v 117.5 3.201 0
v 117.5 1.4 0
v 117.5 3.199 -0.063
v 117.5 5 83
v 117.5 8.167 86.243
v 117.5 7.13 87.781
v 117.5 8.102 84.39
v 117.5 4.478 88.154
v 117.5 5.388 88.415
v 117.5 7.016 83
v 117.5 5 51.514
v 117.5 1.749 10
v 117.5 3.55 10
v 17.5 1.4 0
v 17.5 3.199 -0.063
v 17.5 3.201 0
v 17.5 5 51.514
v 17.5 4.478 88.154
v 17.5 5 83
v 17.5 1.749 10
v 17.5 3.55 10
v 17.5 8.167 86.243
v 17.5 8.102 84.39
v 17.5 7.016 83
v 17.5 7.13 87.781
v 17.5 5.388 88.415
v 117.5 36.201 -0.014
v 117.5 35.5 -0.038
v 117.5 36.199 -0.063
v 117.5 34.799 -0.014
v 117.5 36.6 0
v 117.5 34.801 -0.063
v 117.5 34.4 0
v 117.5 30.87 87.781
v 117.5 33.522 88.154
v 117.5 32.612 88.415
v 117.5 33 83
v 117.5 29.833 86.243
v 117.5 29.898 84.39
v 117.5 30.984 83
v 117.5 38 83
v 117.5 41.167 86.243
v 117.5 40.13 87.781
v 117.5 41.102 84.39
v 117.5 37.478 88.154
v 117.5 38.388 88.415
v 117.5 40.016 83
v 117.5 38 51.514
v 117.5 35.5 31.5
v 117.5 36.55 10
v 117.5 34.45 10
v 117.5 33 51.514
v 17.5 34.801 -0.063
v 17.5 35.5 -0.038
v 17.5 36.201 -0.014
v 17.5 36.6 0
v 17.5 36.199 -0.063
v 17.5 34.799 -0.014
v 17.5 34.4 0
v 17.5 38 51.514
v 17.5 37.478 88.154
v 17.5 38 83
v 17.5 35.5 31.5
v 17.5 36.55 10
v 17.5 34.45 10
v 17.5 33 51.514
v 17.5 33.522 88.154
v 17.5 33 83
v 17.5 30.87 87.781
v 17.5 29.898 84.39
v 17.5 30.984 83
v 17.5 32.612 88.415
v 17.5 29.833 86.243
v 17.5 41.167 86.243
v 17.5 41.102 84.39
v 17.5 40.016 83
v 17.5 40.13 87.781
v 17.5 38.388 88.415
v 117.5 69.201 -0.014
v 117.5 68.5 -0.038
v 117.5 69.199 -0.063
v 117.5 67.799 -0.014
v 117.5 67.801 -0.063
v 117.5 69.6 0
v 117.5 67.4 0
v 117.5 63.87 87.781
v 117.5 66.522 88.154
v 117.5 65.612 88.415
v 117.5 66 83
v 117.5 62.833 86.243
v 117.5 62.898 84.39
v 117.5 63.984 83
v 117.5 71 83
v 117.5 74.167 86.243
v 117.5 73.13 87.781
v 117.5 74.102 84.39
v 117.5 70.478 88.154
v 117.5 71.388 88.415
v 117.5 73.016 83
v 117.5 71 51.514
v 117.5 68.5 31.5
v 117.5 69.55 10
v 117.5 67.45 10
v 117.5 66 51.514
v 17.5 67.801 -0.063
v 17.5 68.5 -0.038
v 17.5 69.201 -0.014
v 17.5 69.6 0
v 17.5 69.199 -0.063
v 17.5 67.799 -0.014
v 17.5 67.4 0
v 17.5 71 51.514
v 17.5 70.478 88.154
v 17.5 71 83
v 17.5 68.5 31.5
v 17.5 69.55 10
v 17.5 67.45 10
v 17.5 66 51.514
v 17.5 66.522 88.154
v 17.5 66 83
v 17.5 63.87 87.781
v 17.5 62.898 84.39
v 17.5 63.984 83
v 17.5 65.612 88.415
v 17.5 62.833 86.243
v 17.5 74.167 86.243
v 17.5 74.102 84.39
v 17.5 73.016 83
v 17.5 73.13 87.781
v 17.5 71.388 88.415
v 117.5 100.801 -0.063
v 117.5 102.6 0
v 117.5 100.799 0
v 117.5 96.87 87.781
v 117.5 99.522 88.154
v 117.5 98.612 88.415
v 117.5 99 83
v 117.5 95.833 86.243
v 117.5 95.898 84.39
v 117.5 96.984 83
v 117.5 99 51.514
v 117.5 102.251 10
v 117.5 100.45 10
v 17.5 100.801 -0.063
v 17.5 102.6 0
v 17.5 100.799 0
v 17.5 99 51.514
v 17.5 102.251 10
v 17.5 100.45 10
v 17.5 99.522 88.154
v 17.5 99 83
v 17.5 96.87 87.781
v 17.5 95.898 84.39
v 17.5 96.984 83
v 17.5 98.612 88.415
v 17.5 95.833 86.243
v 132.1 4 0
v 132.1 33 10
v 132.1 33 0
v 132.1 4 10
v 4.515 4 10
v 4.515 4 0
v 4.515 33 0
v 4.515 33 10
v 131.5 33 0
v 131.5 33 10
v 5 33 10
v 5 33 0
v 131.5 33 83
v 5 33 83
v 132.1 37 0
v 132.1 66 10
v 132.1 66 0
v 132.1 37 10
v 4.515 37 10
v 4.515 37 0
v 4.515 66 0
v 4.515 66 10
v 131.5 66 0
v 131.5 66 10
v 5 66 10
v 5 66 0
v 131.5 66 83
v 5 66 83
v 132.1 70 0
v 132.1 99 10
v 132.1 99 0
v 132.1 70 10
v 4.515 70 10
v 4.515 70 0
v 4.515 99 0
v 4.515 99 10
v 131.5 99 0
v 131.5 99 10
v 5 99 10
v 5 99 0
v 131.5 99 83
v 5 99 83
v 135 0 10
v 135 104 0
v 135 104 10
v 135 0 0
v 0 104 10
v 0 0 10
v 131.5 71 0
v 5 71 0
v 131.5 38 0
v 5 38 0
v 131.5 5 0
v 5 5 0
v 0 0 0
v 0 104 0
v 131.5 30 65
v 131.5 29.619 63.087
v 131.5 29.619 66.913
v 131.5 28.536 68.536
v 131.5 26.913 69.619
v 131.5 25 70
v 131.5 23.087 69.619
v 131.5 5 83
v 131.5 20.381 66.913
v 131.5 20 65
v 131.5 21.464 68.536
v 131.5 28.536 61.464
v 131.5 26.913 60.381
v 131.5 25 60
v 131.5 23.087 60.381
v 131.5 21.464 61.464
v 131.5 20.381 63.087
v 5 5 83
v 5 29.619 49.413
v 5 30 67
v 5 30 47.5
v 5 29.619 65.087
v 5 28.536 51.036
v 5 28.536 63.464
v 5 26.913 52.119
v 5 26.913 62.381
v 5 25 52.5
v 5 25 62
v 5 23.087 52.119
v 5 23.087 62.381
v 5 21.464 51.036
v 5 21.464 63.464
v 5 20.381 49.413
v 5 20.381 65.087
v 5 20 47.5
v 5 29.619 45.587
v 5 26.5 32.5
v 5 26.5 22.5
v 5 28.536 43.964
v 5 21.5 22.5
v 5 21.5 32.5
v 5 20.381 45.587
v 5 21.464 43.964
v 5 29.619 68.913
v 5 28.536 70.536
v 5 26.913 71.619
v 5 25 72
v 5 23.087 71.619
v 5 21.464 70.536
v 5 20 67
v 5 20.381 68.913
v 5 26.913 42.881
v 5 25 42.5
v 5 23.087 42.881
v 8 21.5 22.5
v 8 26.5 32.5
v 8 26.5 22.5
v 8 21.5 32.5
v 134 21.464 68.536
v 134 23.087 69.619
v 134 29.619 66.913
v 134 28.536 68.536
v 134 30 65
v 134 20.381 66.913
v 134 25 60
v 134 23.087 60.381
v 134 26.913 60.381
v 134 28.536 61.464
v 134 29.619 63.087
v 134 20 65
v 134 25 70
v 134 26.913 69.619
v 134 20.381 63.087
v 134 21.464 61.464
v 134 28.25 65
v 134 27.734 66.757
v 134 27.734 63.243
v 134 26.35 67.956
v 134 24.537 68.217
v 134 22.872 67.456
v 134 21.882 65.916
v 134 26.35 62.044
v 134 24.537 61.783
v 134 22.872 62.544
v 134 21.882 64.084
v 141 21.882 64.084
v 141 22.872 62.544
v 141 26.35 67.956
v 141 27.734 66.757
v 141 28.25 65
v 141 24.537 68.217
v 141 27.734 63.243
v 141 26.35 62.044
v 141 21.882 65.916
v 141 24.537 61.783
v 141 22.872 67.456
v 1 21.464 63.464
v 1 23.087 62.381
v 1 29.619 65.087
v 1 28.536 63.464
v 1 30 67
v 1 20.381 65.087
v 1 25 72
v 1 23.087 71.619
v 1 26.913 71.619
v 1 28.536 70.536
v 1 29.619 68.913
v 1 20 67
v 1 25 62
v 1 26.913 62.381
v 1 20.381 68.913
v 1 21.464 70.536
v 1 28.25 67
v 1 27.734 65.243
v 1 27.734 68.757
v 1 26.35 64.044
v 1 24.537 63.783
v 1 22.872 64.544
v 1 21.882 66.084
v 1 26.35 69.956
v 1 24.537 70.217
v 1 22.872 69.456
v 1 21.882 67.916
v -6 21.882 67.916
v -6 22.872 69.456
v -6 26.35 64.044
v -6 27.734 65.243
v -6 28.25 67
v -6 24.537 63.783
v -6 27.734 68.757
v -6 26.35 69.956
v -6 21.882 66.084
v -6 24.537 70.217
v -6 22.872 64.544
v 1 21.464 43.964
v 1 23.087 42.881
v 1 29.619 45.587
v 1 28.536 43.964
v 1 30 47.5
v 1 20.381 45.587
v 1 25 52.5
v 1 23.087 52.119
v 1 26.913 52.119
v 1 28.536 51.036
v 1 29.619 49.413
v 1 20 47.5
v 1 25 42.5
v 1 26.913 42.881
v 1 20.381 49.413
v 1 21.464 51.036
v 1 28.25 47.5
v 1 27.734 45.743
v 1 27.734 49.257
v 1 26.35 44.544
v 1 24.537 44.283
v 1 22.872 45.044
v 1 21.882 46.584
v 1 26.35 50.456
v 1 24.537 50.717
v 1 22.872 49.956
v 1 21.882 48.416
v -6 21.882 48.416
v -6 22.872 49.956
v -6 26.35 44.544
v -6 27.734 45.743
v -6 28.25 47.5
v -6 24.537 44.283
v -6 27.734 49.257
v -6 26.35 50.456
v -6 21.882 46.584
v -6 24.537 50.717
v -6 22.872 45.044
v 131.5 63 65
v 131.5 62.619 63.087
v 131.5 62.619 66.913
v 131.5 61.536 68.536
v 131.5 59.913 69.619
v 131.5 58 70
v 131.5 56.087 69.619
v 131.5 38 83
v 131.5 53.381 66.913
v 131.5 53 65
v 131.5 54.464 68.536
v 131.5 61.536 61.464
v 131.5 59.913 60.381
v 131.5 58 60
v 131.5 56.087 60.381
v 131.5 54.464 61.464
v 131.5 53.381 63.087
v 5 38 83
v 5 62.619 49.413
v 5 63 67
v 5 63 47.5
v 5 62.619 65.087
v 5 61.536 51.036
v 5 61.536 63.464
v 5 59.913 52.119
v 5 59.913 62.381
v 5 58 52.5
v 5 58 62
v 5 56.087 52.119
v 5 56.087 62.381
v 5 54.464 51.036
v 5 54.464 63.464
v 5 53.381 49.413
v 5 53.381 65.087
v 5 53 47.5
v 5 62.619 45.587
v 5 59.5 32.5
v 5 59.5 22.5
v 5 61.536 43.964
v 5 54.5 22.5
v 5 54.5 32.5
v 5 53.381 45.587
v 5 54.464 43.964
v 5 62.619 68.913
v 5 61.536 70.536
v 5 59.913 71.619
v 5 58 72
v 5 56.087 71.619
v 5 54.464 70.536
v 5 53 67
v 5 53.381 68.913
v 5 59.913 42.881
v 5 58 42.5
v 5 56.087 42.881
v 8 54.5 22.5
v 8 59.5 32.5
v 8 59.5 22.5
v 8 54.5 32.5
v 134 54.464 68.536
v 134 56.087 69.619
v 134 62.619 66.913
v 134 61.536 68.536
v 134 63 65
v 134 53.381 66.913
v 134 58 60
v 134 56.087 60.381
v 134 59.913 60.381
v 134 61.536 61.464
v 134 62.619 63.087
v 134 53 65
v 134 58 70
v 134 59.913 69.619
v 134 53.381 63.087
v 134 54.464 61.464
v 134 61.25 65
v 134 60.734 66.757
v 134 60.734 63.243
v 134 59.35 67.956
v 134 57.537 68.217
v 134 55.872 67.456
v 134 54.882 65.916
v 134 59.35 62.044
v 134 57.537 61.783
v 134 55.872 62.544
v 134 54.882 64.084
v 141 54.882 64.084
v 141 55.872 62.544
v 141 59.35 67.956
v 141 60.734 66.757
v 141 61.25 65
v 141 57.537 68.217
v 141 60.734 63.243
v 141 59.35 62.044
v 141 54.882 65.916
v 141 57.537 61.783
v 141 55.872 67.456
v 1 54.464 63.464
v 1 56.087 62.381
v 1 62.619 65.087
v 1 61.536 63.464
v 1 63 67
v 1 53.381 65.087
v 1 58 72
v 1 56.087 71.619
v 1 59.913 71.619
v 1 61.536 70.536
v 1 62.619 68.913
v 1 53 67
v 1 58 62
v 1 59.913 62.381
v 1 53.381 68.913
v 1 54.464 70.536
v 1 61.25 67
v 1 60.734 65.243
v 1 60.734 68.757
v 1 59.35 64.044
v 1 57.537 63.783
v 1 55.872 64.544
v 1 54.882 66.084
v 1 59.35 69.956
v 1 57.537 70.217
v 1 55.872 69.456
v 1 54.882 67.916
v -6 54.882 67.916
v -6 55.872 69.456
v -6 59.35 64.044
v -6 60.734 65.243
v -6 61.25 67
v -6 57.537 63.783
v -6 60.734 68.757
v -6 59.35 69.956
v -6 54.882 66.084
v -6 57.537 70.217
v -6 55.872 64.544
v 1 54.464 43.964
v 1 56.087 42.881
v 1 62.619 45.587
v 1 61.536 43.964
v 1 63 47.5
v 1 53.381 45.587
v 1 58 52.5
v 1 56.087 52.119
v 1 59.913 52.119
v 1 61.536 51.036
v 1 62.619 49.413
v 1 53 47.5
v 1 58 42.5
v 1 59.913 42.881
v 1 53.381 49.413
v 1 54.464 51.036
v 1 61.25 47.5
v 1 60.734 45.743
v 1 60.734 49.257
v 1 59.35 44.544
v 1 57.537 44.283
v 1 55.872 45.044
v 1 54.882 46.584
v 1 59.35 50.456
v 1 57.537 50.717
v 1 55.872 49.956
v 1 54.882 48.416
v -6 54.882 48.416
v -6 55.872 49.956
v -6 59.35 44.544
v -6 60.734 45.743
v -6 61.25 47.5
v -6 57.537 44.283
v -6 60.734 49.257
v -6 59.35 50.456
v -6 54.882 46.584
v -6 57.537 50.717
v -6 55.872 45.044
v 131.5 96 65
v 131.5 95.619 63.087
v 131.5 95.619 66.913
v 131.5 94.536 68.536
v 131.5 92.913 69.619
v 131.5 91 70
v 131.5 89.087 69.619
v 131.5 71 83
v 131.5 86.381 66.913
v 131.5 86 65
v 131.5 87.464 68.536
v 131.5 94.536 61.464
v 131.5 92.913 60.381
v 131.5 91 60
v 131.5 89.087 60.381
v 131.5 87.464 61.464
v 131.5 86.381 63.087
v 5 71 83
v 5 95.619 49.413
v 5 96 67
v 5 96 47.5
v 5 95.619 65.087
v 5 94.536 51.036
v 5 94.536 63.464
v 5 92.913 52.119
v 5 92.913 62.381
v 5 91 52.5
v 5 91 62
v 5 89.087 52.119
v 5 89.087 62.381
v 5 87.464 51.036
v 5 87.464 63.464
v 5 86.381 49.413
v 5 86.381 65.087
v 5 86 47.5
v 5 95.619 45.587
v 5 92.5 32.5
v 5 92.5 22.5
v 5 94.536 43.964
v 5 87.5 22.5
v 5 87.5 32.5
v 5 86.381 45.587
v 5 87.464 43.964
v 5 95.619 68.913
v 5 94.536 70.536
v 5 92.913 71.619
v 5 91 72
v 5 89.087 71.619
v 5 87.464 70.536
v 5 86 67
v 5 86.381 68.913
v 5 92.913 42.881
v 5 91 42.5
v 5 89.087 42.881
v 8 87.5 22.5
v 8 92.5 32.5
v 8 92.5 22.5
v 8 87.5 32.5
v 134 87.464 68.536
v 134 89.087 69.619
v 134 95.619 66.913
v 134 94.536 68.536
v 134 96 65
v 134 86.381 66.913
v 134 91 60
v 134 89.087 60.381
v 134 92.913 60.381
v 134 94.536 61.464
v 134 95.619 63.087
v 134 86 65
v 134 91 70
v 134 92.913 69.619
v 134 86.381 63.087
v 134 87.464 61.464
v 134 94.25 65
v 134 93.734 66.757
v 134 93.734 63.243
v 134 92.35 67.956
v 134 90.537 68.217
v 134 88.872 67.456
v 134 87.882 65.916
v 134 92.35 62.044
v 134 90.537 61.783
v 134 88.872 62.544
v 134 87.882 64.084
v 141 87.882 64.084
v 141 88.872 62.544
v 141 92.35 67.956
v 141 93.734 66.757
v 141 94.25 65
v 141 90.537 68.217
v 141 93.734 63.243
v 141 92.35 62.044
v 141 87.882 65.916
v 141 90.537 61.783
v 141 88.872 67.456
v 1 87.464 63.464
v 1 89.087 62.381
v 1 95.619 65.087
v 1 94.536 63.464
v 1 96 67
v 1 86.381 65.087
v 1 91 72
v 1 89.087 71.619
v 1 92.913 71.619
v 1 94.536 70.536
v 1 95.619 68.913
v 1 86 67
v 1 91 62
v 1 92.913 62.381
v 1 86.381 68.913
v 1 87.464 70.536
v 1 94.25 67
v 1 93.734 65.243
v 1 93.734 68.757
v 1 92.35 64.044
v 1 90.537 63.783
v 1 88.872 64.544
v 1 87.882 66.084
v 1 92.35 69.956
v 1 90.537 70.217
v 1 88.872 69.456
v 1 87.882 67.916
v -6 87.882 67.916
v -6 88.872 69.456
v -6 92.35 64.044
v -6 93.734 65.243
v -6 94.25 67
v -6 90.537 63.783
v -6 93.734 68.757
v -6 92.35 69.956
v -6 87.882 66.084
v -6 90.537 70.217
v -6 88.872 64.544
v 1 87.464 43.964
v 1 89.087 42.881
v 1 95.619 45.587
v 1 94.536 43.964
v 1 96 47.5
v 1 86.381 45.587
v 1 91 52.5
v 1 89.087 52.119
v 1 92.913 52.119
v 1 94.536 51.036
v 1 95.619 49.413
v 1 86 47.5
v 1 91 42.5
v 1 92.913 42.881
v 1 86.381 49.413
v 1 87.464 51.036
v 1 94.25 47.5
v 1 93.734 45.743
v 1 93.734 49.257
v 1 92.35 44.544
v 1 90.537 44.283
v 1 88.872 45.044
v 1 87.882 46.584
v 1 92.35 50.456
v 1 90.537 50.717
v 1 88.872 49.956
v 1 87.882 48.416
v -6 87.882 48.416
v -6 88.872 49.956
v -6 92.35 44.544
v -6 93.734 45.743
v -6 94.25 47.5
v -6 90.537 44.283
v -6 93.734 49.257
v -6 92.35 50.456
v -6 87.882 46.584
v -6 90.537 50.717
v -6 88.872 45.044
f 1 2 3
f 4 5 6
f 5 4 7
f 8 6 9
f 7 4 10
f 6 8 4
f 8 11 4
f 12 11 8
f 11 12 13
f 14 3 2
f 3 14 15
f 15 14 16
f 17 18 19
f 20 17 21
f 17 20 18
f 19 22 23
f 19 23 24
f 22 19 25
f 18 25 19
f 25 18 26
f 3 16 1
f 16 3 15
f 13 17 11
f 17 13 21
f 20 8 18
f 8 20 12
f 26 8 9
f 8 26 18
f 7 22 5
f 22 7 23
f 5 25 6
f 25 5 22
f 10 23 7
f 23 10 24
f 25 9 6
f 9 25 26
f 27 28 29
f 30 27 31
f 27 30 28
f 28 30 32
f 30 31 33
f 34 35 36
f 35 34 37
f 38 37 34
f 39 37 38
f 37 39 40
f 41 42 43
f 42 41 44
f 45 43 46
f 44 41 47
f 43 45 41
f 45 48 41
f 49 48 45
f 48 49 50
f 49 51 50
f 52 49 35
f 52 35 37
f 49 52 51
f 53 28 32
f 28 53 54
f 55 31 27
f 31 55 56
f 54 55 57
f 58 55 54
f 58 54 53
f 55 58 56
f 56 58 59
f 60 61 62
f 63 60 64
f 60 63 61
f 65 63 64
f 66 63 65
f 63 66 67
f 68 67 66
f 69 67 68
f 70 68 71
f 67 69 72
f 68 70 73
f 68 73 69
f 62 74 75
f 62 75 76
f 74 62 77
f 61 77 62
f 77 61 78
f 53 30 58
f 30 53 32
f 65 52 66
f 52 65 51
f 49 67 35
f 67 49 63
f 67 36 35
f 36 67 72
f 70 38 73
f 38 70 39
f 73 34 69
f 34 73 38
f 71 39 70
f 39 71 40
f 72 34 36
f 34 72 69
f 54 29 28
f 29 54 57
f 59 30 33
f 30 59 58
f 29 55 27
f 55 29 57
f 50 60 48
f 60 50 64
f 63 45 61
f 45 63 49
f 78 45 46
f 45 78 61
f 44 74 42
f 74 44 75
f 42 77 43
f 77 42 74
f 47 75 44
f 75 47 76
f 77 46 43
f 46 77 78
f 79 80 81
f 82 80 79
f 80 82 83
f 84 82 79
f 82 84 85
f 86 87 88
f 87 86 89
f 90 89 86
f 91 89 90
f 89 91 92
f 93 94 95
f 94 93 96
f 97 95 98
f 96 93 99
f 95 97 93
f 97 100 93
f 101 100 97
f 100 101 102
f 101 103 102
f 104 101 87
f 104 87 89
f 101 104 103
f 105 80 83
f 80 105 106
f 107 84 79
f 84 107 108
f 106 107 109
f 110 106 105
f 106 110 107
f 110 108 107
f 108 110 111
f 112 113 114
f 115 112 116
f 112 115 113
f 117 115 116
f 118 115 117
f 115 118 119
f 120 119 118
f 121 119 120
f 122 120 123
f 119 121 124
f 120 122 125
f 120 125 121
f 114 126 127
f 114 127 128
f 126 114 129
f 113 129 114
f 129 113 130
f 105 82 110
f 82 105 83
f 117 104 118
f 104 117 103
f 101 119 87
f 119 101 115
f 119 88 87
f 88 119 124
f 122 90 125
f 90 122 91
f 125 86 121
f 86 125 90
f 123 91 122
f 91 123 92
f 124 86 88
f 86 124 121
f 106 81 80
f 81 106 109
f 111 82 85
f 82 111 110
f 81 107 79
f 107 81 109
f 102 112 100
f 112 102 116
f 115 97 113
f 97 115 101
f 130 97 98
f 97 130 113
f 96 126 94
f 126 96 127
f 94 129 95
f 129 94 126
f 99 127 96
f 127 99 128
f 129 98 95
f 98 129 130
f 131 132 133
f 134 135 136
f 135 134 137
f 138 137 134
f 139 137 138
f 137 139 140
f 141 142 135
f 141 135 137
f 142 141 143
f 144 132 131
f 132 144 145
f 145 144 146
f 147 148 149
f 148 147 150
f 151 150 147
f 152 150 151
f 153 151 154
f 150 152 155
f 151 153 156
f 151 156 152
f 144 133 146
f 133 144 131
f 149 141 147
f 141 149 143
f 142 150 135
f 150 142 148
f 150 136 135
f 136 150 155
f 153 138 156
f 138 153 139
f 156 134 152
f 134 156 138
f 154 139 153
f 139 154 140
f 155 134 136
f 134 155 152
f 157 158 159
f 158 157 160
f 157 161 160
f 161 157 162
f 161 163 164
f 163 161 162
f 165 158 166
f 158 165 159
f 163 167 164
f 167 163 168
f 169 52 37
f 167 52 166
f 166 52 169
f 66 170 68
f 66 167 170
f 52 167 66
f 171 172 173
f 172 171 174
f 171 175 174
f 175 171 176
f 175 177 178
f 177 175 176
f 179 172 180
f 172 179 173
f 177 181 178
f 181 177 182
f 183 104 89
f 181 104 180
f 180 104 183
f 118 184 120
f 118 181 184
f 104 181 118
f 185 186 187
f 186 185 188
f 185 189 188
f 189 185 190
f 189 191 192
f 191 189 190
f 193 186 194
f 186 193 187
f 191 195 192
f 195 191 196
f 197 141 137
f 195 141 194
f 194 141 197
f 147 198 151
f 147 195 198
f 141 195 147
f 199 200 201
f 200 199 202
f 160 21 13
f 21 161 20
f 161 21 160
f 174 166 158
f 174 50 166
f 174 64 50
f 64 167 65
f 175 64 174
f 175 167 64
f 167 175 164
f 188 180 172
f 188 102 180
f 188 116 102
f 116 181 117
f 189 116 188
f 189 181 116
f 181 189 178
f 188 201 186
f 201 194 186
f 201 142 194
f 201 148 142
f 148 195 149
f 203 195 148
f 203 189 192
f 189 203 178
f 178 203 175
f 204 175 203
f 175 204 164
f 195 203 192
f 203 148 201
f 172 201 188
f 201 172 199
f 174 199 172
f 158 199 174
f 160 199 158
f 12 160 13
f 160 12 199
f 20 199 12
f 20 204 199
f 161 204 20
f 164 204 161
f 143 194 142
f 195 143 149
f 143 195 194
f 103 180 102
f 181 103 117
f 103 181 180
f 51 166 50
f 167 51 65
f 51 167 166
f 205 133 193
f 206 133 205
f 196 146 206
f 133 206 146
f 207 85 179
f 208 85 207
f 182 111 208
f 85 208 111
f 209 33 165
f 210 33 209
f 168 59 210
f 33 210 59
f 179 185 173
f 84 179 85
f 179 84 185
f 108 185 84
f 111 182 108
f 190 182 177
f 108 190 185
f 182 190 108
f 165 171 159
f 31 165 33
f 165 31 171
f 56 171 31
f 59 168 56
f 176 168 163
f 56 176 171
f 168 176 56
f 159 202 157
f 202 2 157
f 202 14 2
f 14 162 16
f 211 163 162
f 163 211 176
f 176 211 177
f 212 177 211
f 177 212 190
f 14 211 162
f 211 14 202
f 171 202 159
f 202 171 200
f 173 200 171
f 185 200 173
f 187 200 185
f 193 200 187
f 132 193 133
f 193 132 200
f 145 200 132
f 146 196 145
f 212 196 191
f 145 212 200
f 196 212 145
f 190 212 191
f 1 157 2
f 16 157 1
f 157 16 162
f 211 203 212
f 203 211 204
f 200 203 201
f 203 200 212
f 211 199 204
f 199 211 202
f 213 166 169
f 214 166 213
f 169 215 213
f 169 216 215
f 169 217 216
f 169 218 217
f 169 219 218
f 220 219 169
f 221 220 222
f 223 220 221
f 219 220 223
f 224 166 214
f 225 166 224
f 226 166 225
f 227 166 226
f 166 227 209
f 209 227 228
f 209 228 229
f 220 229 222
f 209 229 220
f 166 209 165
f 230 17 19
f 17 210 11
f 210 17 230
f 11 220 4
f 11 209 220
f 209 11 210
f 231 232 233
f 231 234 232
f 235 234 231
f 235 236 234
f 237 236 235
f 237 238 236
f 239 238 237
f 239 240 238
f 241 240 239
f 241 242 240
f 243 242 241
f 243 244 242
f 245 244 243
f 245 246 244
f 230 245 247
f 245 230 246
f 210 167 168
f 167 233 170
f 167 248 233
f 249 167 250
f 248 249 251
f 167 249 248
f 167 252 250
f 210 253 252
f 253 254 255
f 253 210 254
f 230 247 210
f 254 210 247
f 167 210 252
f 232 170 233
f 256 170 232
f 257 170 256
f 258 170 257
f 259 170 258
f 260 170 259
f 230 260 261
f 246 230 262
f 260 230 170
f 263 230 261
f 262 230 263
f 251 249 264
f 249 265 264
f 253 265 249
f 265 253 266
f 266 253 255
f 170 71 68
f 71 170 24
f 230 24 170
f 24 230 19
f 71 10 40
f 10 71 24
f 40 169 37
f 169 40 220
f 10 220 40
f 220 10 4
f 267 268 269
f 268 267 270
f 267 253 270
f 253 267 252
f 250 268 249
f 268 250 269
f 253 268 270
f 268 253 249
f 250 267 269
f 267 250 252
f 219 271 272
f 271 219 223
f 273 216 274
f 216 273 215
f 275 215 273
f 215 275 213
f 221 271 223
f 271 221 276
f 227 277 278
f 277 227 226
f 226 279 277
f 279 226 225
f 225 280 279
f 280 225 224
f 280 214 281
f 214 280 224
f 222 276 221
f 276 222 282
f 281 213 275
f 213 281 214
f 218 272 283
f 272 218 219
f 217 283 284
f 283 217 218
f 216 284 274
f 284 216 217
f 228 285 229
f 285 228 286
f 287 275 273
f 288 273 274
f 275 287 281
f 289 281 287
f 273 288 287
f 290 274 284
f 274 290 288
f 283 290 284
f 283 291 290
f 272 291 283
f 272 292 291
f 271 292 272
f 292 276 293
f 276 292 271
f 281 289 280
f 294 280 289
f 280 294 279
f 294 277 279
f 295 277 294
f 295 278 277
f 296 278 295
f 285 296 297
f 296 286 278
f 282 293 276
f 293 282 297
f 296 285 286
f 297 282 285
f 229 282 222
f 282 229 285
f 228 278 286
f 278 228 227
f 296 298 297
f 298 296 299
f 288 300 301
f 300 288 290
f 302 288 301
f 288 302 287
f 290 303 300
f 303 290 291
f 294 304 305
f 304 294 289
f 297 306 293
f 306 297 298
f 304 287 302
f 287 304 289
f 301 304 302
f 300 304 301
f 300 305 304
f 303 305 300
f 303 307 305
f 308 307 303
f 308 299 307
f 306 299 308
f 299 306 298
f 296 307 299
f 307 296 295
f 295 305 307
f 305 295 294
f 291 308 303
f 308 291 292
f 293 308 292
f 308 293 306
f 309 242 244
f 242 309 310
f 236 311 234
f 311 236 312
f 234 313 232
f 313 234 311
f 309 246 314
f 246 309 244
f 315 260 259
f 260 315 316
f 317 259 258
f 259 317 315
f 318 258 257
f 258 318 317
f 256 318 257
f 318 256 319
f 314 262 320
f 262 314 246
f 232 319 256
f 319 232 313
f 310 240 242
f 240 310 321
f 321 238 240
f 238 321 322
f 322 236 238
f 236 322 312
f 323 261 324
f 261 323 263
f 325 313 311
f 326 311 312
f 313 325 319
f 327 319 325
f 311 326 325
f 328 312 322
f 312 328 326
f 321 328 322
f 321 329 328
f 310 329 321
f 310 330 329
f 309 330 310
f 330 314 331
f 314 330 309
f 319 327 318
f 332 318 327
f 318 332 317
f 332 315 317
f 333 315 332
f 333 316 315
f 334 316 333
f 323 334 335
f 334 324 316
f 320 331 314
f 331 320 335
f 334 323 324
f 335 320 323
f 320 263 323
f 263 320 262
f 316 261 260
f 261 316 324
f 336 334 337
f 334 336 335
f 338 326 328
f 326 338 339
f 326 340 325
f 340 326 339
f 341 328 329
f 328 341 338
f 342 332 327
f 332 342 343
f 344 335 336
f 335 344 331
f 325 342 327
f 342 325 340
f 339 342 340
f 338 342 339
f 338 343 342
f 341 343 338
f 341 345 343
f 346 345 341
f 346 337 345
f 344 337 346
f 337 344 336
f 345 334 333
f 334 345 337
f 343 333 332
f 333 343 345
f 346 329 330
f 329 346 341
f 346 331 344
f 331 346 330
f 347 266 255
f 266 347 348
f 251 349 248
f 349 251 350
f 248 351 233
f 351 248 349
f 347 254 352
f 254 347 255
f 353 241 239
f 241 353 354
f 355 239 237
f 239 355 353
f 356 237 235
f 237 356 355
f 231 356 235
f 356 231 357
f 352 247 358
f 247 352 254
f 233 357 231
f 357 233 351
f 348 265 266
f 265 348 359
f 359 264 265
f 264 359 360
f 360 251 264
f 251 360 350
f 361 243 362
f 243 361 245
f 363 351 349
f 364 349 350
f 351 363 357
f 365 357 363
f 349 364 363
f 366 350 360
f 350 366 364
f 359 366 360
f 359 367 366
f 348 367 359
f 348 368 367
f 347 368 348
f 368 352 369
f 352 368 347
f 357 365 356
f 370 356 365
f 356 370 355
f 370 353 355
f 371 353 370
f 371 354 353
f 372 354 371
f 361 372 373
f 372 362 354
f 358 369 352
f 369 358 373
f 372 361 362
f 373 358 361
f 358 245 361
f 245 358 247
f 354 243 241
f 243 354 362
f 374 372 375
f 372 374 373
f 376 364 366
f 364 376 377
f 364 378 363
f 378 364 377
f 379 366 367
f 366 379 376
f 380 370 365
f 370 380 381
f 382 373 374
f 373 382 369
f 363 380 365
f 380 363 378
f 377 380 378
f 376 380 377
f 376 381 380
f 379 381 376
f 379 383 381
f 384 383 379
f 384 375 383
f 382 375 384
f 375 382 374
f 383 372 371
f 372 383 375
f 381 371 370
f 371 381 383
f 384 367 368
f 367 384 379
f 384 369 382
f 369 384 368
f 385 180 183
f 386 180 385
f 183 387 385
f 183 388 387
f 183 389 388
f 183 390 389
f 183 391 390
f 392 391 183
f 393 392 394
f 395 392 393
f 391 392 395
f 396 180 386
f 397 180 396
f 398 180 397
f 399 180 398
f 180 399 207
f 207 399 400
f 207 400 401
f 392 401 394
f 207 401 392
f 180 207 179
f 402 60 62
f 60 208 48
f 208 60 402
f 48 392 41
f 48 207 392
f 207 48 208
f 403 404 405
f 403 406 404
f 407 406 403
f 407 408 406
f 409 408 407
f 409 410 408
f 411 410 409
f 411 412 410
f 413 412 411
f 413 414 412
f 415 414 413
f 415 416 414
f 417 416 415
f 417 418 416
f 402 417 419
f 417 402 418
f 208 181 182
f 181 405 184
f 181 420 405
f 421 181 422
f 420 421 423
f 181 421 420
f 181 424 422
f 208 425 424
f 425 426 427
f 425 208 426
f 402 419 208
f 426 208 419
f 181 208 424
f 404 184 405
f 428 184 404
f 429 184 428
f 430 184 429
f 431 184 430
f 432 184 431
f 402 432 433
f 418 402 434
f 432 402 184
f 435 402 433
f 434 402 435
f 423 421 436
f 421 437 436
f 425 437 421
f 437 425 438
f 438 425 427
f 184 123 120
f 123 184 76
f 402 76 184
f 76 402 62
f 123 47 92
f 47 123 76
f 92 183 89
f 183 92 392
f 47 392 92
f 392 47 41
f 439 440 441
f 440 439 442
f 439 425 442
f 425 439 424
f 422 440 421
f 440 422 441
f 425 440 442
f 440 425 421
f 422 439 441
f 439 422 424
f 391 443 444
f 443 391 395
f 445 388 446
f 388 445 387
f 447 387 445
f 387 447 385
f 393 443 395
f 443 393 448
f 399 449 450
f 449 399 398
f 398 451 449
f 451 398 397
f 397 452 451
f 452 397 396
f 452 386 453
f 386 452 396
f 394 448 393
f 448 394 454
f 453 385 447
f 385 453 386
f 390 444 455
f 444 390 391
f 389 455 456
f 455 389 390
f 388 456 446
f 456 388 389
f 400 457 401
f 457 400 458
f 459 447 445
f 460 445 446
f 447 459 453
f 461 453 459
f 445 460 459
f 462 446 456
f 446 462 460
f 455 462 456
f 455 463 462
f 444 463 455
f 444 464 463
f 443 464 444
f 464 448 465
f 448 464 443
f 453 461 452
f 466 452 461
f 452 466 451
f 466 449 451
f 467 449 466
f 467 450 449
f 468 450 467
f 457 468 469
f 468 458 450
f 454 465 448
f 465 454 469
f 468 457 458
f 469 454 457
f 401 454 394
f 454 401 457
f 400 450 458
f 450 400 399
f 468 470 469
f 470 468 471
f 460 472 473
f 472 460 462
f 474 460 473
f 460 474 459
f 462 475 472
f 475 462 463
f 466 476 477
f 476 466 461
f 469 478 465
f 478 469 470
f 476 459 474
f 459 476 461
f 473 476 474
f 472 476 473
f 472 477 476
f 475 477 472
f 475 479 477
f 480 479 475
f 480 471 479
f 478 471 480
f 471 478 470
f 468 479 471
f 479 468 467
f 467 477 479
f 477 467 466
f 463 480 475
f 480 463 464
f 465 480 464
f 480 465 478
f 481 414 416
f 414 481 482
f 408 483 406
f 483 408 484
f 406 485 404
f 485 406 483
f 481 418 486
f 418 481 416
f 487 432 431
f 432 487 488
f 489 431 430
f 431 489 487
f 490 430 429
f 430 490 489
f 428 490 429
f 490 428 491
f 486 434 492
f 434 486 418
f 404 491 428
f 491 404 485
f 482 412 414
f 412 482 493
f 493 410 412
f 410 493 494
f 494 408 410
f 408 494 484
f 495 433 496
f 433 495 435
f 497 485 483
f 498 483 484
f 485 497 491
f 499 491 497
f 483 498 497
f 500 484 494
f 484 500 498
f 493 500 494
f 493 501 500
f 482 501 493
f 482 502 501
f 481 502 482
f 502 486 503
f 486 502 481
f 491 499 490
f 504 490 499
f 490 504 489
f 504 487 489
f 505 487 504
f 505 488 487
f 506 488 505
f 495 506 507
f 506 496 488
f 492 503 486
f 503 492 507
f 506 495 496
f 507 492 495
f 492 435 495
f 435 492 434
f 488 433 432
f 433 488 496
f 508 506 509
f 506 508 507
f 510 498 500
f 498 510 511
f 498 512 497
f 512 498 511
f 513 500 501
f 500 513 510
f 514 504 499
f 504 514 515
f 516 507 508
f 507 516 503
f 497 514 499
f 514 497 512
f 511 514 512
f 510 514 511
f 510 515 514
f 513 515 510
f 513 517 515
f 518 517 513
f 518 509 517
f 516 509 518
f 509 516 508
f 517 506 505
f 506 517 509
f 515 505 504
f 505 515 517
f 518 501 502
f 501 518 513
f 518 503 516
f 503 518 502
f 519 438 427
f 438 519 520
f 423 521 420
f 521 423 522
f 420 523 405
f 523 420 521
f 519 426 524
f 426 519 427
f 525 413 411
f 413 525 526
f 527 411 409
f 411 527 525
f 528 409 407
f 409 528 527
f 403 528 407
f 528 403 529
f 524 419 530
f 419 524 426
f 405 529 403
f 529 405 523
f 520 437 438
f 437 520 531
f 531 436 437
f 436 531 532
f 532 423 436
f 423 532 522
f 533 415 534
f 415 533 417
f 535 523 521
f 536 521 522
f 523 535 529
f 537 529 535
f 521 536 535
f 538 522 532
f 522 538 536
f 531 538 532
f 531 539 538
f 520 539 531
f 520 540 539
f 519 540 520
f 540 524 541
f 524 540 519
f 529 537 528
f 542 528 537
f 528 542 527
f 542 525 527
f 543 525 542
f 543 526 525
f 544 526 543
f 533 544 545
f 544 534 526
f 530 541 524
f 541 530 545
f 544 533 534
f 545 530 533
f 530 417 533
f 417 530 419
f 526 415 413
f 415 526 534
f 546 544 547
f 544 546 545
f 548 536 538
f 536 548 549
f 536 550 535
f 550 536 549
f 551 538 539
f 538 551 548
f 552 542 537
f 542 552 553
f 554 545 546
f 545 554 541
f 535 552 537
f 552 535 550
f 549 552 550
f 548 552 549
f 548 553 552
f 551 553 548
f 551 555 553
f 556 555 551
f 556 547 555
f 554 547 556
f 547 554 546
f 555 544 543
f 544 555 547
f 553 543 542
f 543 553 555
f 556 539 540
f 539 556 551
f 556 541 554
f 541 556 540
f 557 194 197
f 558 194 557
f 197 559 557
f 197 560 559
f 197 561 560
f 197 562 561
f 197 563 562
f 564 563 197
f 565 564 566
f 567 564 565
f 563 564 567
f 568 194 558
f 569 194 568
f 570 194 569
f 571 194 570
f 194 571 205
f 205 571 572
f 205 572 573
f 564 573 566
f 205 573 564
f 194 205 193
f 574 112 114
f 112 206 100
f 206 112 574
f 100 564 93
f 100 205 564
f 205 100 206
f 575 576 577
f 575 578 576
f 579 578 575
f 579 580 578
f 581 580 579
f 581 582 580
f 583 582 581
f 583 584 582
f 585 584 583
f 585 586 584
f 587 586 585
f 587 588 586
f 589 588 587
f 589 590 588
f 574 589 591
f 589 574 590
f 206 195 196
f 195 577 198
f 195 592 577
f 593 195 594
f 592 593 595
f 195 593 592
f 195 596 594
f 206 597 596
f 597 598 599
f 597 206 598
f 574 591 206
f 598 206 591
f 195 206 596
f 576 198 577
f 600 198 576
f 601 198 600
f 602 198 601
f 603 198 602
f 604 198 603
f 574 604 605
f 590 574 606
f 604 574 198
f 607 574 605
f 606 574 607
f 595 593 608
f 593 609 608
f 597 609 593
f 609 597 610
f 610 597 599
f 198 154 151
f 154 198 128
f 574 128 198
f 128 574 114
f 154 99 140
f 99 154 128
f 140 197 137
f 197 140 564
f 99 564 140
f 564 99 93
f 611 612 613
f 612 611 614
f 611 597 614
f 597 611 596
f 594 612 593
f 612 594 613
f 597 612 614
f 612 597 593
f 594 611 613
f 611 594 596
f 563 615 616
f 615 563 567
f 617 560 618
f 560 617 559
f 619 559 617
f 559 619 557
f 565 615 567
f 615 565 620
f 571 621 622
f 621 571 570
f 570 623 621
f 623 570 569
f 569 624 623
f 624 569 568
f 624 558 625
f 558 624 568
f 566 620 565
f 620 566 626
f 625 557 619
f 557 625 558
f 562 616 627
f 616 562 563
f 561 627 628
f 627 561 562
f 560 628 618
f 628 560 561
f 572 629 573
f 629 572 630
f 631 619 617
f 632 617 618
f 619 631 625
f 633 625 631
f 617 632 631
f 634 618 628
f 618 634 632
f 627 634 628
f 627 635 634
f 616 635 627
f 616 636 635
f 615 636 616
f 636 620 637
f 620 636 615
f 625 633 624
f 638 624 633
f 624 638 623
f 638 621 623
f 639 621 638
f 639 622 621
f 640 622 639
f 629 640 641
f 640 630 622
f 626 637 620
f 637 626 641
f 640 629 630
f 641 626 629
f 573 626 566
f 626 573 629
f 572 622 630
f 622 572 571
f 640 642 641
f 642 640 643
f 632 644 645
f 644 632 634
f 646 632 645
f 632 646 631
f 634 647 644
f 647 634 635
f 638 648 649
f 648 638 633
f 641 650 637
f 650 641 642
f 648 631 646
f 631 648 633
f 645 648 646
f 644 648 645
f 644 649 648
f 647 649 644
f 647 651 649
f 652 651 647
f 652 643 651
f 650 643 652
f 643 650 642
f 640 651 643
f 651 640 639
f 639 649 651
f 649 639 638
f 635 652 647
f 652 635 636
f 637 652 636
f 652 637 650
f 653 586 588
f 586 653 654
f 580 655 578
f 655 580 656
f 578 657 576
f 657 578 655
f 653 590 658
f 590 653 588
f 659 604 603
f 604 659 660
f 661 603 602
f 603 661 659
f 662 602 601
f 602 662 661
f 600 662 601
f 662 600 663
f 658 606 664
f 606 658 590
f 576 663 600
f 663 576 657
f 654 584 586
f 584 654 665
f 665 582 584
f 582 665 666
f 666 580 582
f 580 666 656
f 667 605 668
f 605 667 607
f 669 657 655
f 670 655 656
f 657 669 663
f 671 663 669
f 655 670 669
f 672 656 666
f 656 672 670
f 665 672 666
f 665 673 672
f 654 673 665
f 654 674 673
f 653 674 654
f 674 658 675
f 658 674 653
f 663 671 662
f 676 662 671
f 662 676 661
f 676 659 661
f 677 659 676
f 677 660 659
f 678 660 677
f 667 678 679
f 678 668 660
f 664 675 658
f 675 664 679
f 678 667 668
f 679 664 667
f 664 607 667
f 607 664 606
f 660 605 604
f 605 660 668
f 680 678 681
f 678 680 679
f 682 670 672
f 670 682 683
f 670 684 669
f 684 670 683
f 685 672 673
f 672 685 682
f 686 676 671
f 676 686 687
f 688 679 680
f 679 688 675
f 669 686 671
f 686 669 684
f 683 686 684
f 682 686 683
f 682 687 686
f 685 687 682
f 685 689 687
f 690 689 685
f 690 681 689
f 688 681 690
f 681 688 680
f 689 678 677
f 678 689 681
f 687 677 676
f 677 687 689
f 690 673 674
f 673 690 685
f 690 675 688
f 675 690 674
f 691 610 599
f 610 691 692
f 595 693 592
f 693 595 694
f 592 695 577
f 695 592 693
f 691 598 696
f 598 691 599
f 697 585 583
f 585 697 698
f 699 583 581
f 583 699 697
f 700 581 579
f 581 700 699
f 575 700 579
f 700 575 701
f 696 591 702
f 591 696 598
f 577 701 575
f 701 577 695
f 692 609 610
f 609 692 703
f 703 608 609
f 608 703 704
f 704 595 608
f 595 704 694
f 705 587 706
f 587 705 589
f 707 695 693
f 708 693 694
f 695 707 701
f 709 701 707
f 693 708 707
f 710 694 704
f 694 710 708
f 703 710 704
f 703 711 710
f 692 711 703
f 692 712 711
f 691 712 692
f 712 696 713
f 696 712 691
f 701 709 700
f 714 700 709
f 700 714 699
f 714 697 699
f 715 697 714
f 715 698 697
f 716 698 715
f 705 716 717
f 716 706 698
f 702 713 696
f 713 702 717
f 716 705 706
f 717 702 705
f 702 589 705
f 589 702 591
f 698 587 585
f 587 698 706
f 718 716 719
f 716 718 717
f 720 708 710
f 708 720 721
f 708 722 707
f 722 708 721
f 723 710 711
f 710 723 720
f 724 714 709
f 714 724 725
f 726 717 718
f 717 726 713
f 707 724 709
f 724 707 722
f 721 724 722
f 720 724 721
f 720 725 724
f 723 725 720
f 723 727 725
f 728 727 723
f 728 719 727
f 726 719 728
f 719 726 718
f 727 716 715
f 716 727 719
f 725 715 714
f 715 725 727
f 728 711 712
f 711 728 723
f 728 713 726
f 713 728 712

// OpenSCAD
s = 5;
module hackRfBody(){
    cube([126.5, 83, 28]);
}

module centerCube(v){
    translate([-v[0]/2,-v[1]/2,0]) cube(v);
}

module smaConnector(){
    rotate([0,90,0]){
cylinder(4,10/2, 10/2);
translate([0,0,4])cylinder(7, 6.5/2, 6.5/2);
    }
}

module button(){
rotate([0,90,0]) cylinder(1, 1, 1);
}

module placeSmaConnectors(){
    translate([125,83-18,8])children();
    translate([0,83-16,8])rotate([0,0,180])children();
    translate([0,83-(16+19.5),8])rotate([0,0,180])children();
}

module placeButtons(){
    translate([125, 15, 12]) children();
    translate([125, 32, 12]) children();
}

module usbNotch(){
    rotate(0,90,0)centerCube([6,10, 5]);
}

module placeUsbNotch(){
    translate([0,27.5,6.5]) children();
}

module hackRf(){
    difference(){
        hackRfBody();
        placeUsbNotch() usbNotch();
    }
    placeSmaConnectors() smaConnector();
    placeButtons() button();
    
}

module placeHackRfs(){
    translate([s,28+s,0]) rotate([90,0,0]) children();
    translate([s,(28+s)*2,0]) rotate([90,0,0]) children();
    translate([s,(28+s)*3,0]) rotate([90,0,0]) children();
}
module flarp(){
    intersection(){
        union(){
    cube([100, 1.8, 83]);
    translate([0,1.8/2, 83+2.5])rotate([0,90,0])cylinder(100, 3, 3);
        }
    cube(150);
    }
}

module flarps(ang){
    d = 6;
    rotate([-90,0,0])translate([0,-0.6*d-28,0]){
    rotate([-ang,0,0]) flarp();
    translate([0,28+d*1.2,0])mirror([0,1,0]) rotate([-ang,0,0])flarp();
    }
}

module hackRack(){
translate([25/2,0,0]) placeHackRfs() flarps(2);
    difference(){
        cube([125+2*s, (28)*3+4*s, 10]);
   
    placeHackRfs() minkowski() {hackRf(); cylinder(1,0.6, 0.6);}

    }
}
hackRack();
placeHackRfs() hackRf();
